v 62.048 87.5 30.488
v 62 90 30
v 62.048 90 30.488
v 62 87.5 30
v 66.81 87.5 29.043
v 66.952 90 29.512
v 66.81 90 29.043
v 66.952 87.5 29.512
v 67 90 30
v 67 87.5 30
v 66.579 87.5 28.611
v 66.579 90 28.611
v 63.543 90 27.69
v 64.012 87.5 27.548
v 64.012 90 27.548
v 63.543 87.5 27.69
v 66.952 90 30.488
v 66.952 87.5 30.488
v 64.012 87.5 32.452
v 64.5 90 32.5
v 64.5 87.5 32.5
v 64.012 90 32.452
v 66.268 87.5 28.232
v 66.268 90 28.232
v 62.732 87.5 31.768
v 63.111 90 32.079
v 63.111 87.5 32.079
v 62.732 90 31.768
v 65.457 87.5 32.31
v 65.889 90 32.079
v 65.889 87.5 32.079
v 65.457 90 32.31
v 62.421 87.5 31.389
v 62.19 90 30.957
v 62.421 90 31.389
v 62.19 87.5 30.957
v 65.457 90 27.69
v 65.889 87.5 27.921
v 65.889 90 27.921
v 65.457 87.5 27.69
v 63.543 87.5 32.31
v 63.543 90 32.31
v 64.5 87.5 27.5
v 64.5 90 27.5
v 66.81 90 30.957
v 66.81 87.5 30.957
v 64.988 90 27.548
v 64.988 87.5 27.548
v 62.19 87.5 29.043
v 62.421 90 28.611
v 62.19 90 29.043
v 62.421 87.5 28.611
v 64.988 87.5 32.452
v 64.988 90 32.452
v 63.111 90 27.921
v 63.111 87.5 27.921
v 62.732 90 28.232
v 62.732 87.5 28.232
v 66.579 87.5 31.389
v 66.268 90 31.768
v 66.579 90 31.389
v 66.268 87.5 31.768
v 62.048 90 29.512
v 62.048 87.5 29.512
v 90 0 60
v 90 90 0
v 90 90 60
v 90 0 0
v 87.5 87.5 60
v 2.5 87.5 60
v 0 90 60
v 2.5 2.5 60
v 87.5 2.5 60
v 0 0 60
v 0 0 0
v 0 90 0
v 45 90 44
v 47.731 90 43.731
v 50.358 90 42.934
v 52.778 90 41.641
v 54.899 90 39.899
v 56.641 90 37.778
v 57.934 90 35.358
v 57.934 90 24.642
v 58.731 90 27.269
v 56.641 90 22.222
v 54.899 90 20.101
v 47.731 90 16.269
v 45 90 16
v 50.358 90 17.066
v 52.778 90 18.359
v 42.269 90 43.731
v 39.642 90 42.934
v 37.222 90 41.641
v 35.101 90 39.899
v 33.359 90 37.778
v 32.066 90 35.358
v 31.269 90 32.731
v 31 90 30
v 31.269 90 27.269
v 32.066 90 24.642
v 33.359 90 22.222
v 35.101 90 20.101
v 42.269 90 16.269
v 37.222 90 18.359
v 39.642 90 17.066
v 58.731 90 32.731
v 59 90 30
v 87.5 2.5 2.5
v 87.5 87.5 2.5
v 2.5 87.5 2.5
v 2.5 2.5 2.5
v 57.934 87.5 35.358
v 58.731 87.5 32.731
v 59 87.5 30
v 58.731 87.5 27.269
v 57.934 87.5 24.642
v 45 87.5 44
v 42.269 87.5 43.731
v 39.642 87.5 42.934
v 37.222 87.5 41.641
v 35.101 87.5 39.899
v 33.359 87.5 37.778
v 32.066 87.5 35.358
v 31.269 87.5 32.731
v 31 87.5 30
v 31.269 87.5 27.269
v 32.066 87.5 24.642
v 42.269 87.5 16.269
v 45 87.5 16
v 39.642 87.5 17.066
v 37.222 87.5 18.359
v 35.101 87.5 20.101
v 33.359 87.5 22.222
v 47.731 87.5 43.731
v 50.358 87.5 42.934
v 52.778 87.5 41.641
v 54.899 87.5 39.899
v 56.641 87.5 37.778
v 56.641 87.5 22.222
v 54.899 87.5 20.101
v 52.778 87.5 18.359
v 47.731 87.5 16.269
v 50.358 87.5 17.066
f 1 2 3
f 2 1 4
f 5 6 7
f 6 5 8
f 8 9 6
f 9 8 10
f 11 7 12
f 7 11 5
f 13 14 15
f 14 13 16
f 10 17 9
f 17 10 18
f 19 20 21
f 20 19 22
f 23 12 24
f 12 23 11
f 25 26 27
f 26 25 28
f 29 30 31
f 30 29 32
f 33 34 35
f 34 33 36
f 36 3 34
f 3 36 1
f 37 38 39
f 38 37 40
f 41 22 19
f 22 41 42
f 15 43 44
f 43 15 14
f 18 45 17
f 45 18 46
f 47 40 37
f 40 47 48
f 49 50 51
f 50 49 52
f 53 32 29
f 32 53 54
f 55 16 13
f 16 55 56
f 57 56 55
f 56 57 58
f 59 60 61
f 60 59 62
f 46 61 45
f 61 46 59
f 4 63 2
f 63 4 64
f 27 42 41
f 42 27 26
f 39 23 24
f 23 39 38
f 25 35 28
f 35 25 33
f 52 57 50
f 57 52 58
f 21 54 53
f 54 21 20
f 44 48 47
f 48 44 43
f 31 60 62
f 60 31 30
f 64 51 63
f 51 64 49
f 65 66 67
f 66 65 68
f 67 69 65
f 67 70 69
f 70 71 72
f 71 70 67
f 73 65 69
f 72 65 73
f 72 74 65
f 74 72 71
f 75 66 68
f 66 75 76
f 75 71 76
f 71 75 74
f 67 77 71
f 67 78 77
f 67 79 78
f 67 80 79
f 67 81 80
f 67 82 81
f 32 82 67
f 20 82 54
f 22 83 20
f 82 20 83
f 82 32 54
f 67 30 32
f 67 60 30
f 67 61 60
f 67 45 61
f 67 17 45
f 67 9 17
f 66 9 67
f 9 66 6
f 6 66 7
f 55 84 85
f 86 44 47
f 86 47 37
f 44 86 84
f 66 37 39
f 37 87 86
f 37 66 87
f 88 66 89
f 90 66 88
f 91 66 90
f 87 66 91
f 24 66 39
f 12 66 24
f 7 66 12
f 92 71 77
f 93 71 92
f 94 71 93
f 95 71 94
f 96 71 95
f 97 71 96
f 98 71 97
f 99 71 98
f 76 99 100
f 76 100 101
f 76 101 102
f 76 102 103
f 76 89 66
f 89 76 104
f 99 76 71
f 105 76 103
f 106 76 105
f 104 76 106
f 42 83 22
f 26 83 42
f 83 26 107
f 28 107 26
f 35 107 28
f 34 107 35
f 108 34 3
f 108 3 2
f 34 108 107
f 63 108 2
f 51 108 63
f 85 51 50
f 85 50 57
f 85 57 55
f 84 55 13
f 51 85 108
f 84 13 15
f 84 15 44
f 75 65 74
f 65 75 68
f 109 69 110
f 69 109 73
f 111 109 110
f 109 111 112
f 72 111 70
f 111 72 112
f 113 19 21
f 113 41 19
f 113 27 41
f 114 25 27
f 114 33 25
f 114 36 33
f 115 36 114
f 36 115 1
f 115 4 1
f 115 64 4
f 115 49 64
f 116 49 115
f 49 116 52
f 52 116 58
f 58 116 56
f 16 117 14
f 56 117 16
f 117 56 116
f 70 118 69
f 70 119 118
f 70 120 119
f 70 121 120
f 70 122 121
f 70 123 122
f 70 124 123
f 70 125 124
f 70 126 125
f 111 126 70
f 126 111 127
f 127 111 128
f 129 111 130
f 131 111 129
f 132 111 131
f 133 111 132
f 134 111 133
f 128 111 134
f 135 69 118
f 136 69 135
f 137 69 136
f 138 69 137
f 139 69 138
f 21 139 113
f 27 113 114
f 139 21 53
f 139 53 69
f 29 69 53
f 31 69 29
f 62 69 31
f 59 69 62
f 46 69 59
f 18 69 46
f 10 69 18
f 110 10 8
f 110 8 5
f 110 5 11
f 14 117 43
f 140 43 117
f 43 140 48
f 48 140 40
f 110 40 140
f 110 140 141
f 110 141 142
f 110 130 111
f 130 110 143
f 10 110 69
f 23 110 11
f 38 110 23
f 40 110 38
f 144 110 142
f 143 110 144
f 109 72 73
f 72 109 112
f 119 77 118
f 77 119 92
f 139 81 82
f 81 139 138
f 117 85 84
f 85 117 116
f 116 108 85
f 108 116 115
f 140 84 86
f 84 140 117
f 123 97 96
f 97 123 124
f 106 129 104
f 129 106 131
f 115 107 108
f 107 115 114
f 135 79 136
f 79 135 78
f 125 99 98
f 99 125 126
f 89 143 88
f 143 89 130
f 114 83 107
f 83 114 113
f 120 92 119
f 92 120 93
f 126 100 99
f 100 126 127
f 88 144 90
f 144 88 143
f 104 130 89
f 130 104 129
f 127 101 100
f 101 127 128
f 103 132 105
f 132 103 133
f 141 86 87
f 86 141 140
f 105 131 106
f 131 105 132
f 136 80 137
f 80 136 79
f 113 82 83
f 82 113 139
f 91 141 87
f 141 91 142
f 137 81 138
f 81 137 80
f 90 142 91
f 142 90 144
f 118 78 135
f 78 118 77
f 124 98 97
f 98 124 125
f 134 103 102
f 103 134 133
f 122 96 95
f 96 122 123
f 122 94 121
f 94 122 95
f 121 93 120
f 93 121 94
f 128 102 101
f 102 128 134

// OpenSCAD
$fn = 32;

// ----------------------------------------------------------------------
// Vent box: roundvent enclosure
// ----------------------------------------------------------------------

// --- parameters (mm) ---
box_l = 90;               // box length, X
box_w = 90;               // box width, Y
box_h = 60;               // box height, Z
wall_t = 2.5;             // shell wall thickness
vent_d = 28;              // central vent diameter
ring_d = 5;               // ring hole diameter
n_ring = 6;               // holes in the ring
ring_r = 19.5;            // ring radius

ring_step = 360 / n_ring;  // ring hole angular step

difference() {
  cube([box_l, box_w, box_h]);
  translate([wall_t, wall_t, wall_t])
    cube([box_l - 2 * wall_t, box_w - 2 * wall_t, box_h]);
  translate([box_l / 2, box_w - wall_t - 1, box_h / 2])
    rotate([-90, 0, 0]) cylinder(h = wall_t + 2, d = vent_d);
  for (i = [0 : n_ring - 1])
    translate([box_l / 2, box_w - wall_t - 1, box_h / 2])
      rotate([0, 0, i * ring_step])
        translate([ring_r, 0, 0]) rotate([-90, 0, 0])
          cylinder(h = wall_t + 2, d = ring_d);
}
